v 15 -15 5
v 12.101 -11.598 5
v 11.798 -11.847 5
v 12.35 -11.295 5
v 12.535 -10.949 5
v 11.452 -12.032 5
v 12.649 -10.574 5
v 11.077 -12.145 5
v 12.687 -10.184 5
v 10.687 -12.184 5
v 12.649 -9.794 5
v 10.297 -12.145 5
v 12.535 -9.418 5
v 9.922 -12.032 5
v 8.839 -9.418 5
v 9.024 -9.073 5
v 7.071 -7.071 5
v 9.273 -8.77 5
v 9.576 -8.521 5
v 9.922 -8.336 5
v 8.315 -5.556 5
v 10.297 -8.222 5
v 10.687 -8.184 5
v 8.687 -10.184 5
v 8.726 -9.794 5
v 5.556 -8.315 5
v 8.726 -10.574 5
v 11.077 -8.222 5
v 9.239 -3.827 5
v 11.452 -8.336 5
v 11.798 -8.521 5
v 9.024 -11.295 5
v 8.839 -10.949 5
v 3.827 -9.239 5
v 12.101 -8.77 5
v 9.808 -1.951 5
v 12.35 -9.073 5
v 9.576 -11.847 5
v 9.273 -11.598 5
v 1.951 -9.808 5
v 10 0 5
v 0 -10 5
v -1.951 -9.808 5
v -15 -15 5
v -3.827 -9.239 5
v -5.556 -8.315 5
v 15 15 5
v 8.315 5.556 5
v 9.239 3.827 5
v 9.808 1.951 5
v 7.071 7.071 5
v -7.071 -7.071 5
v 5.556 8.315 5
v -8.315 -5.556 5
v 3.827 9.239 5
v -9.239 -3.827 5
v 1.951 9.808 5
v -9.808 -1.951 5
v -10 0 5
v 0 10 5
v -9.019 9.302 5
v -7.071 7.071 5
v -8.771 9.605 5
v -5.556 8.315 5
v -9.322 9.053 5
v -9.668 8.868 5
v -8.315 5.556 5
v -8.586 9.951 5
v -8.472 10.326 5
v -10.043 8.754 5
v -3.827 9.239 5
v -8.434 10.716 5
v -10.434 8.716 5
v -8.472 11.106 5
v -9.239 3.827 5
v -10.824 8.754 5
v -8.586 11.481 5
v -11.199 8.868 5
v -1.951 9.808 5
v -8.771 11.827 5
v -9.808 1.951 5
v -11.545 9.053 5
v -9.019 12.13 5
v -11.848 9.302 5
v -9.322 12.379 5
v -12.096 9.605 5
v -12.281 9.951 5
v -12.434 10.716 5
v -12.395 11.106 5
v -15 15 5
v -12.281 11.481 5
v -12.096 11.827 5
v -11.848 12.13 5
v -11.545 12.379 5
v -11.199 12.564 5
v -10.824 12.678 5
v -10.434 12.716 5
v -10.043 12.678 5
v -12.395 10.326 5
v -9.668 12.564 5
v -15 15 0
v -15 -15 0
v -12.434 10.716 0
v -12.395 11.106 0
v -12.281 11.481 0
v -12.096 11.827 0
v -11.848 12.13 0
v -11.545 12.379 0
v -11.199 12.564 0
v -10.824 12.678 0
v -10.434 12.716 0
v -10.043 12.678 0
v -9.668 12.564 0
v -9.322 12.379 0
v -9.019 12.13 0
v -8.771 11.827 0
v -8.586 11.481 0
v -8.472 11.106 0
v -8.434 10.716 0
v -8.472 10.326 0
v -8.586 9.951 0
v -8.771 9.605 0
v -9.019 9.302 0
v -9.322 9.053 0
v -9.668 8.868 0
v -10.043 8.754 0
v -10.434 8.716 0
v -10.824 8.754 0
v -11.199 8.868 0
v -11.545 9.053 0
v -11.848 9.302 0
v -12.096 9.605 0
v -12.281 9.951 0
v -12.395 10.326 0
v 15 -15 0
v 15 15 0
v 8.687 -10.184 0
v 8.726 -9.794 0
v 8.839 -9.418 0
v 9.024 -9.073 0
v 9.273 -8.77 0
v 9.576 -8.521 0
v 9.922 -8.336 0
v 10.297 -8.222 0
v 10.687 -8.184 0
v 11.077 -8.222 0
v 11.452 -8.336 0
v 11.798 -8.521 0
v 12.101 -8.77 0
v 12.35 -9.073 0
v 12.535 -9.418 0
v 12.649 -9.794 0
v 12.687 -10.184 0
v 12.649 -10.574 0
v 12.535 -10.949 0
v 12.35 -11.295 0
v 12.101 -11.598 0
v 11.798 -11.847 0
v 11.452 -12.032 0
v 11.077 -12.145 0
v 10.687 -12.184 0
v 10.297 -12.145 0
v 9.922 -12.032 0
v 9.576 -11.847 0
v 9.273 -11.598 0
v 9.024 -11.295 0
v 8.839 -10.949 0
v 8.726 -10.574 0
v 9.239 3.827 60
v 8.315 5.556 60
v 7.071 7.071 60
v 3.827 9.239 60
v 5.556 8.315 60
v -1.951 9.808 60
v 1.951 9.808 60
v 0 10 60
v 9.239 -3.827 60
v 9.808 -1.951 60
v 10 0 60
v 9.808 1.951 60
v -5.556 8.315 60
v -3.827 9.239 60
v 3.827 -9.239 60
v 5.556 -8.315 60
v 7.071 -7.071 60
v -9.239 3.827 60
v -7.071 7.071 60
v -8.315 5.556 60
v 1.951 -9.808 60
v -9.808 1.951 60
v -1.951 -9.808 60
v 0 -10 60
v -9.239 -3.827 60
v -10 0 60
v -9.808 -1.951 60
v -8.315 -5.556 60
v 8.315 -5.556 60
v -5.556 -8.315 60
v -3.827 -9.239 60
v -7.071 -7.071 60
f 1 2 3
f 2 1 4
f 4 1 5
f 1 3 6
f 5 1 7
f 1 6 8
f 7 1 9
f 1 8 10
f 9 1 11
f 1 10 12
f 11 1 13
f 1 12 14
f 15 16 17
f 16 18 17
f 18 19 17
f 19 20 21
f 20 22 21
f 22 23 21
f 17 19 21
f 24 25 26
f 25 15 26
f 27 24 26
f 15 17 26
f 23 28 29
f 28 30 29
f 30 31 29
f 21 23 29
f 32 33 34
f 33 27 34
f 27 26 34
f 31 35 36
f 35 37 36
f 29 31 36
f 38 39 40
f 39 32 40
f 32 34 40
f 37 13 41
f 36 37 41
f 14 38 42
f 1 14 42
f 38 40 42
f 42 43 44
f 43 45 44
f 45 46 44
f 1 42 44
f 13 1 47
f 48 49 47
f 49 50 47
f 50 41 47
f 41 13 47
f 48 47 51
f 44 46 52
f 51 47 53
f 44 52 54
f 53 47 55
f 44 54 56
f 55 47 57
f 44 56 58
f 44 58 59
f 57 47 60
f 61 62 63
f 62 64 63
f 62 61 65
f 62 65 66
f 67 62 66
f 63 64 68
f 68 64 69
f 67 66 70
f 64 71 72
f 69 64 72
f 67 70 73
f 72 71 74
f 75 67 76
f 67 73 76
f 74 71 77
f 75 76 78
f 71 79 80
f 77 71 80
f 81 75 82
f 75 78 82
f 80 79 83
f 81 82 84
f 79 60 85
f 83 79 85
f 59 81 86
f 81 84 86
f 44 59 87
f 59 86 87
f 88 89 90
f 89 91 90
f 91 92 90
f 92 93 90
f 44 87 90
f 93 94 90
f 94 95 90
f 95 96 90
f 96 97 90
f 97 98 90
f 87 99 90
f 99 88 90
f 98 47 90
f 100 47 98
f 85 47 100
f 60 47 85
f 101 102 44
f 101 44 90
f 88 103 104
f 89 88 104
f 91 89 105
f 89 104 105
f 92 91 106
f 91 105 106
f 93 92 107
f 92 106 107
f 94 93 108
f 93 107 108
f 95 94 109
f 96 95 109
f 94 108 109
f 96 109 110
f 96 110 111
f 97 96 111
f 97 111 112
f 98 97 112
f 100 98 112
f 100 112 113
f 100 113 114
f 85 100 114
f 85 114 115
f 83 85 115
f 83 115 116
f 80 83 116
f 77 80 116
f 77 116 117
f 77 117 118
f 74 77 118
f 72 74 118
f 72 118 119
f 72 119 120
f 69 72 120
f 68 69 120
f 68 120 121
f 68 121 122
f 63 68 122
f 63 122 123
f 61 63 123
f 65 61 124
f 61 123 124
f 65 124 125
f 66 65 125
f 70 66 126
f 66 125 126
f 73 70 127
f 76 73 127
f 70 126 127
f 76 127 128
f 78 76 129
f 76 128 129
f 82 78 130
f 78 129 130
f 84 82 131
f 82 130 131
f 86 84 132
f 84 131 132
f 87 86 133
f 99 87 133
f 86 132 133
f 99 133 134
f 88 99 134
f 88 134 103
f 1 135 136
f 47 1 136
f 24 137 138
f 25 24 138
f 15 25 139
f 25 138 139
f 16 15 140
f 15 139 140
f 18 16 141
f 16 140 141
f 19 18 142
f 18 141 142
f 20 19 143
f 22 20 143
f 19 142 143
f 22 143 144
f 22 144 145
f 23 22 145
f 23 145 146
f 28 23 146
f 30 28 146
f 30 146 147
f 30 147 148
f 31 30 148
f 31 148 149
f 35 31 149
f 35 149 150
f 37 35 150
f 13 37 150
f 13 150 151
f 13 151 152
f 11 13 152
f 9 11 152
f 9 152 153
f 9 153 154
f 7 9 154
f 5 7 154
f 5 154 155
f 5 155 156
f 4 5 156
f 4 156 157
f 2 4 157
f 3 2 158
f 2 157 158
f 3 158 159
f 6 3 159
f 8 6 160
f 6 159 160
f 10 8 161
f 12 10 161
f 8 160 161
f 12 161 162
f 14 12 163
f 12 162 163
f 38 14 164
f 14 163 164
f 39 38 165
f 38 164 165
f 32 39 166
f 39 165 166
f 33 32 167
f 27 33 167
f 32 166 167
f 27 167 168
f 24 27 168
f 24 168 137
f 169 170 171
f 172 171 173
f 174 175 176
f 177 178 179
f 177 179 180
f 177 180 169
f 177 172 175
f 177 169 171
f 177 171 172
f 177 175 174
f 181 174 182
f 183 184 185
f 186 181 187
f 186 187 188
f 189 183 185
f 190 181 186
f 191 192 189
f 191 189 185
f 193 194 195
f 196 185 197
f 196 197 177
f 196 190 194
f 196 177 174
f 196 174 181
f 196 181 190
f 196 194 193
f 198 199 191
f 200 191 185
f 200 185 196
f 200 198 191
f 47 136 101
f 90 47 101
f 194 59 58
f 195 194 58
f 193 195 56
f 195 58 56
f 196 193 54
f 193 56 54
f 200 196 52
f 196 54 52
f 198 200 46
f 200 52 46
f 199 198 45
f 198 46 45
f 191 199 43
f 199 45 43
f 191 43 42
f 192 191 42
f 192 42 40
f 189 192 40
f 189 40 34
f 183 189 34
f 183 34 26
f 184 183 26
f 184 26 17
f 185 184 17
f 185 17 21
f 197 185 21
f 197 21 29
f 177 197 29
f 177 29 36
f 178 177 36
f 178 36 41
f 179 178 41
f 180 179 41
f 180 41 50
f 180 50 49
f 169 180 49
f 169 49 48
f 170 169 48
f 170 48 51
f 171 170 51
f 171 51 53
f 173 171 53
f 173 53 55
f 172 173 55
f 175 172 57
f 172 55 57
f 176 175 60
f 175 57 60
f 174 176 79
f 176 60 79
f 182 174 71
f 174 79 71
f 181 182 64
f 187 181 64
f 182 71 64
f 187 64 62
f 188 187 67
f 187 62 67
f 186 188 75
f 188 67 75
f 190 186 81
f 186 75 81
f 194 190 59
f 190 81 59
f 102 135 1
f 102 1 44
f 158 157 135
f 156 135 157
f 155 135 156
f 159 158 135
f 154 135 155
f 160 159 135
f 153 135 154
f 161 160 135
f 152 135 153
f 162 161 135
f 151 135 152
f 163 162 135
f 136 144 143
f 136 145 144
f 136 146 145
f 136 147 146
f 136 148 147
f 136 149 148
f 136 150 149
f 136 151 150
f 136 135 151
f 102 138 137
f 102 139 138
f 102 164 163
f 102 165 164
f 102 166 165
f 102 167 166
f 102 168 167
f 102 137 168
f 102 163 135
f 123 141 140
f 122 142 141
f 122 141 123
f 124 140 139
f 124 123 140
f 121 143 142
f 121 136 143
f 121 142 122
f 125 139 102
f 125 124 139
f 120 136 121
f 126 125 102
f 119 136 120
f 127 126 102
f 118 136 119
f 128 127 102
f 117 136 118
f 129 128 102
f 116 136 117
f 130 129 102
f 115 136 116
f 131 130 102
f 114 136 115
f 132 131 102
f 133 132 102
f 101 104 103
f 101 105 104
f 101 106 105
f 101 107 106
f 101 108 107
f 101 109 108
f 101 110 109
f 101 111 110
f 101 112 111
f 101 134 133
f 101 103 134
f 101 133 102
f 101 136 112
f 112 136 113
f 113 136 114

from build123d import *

# Parameters (mm, degrees)
SKETCH1_R                 = 10
BOSS_EXTRUDE1_DEPTH       = 60
SKETCH3_W                 = 30
SKETCH3_H                 = 30
BOSS_EXTRUDE2_DEPTH       = 5
F_4_0MM_DOWEL_HOLE1_D     = 4
F_4_0MM_DOWEL_HOLE1_DEPTH = 35
F_4_0MM_DOWEL_HOLE1_TIP   = 1.201721238


with BuildPart() as part:
    # Sketch1 → Boss-Extrude1 (new body)
    with BuildSketch(Plane.XY):
        with Locations(Location((0, 0, 0), (0, 0, 180))):
            Circle(SKETCH1_R)
    extrude(amount=BOSS_EXTRUDE1_DEPTH)

    # Sketch3 → Boss-Extrude2 (add)
    with BuildSketch(Plane(origin=(0, 0, 0), x_dir=(-1, 0, 0), z_dir=(0, 0, -1))):
        Rectangle(SKETCH3_W, SKETCH3_H)
    extrude(amount=-BOSS_EXTRUDE2_DEPTH)

    # Ø4.0mm Dowel Hole1
    with Locations(Plane(origin=(-10.433527311, 10.715968246, 5), x_dir=(1, 0, 0), z_dir=(0, 0, 1))):
        with Locations((0, 0), (21.120601919, -20.899829076)):
            Hole(F_4_0MM_DOWEL_HOLE1_D / 2, depth=F_4_0MM_DOWEL_HOLE1_DEPTH)
            with Locations((0, 0, -(F_4_0MM_DOWEL_HOLE1_DEPTH + F_4_0MM_DOWEL_HOLE1_TIP / 2))):  # 118° drill point
                Cone(0, F_4_0MM_DOWEL_HOLE1_D / 2, F_4_0MM_DOWEL_HOLE1_TIP, mode=Mode.SUBTRACT)


solid = part.part
